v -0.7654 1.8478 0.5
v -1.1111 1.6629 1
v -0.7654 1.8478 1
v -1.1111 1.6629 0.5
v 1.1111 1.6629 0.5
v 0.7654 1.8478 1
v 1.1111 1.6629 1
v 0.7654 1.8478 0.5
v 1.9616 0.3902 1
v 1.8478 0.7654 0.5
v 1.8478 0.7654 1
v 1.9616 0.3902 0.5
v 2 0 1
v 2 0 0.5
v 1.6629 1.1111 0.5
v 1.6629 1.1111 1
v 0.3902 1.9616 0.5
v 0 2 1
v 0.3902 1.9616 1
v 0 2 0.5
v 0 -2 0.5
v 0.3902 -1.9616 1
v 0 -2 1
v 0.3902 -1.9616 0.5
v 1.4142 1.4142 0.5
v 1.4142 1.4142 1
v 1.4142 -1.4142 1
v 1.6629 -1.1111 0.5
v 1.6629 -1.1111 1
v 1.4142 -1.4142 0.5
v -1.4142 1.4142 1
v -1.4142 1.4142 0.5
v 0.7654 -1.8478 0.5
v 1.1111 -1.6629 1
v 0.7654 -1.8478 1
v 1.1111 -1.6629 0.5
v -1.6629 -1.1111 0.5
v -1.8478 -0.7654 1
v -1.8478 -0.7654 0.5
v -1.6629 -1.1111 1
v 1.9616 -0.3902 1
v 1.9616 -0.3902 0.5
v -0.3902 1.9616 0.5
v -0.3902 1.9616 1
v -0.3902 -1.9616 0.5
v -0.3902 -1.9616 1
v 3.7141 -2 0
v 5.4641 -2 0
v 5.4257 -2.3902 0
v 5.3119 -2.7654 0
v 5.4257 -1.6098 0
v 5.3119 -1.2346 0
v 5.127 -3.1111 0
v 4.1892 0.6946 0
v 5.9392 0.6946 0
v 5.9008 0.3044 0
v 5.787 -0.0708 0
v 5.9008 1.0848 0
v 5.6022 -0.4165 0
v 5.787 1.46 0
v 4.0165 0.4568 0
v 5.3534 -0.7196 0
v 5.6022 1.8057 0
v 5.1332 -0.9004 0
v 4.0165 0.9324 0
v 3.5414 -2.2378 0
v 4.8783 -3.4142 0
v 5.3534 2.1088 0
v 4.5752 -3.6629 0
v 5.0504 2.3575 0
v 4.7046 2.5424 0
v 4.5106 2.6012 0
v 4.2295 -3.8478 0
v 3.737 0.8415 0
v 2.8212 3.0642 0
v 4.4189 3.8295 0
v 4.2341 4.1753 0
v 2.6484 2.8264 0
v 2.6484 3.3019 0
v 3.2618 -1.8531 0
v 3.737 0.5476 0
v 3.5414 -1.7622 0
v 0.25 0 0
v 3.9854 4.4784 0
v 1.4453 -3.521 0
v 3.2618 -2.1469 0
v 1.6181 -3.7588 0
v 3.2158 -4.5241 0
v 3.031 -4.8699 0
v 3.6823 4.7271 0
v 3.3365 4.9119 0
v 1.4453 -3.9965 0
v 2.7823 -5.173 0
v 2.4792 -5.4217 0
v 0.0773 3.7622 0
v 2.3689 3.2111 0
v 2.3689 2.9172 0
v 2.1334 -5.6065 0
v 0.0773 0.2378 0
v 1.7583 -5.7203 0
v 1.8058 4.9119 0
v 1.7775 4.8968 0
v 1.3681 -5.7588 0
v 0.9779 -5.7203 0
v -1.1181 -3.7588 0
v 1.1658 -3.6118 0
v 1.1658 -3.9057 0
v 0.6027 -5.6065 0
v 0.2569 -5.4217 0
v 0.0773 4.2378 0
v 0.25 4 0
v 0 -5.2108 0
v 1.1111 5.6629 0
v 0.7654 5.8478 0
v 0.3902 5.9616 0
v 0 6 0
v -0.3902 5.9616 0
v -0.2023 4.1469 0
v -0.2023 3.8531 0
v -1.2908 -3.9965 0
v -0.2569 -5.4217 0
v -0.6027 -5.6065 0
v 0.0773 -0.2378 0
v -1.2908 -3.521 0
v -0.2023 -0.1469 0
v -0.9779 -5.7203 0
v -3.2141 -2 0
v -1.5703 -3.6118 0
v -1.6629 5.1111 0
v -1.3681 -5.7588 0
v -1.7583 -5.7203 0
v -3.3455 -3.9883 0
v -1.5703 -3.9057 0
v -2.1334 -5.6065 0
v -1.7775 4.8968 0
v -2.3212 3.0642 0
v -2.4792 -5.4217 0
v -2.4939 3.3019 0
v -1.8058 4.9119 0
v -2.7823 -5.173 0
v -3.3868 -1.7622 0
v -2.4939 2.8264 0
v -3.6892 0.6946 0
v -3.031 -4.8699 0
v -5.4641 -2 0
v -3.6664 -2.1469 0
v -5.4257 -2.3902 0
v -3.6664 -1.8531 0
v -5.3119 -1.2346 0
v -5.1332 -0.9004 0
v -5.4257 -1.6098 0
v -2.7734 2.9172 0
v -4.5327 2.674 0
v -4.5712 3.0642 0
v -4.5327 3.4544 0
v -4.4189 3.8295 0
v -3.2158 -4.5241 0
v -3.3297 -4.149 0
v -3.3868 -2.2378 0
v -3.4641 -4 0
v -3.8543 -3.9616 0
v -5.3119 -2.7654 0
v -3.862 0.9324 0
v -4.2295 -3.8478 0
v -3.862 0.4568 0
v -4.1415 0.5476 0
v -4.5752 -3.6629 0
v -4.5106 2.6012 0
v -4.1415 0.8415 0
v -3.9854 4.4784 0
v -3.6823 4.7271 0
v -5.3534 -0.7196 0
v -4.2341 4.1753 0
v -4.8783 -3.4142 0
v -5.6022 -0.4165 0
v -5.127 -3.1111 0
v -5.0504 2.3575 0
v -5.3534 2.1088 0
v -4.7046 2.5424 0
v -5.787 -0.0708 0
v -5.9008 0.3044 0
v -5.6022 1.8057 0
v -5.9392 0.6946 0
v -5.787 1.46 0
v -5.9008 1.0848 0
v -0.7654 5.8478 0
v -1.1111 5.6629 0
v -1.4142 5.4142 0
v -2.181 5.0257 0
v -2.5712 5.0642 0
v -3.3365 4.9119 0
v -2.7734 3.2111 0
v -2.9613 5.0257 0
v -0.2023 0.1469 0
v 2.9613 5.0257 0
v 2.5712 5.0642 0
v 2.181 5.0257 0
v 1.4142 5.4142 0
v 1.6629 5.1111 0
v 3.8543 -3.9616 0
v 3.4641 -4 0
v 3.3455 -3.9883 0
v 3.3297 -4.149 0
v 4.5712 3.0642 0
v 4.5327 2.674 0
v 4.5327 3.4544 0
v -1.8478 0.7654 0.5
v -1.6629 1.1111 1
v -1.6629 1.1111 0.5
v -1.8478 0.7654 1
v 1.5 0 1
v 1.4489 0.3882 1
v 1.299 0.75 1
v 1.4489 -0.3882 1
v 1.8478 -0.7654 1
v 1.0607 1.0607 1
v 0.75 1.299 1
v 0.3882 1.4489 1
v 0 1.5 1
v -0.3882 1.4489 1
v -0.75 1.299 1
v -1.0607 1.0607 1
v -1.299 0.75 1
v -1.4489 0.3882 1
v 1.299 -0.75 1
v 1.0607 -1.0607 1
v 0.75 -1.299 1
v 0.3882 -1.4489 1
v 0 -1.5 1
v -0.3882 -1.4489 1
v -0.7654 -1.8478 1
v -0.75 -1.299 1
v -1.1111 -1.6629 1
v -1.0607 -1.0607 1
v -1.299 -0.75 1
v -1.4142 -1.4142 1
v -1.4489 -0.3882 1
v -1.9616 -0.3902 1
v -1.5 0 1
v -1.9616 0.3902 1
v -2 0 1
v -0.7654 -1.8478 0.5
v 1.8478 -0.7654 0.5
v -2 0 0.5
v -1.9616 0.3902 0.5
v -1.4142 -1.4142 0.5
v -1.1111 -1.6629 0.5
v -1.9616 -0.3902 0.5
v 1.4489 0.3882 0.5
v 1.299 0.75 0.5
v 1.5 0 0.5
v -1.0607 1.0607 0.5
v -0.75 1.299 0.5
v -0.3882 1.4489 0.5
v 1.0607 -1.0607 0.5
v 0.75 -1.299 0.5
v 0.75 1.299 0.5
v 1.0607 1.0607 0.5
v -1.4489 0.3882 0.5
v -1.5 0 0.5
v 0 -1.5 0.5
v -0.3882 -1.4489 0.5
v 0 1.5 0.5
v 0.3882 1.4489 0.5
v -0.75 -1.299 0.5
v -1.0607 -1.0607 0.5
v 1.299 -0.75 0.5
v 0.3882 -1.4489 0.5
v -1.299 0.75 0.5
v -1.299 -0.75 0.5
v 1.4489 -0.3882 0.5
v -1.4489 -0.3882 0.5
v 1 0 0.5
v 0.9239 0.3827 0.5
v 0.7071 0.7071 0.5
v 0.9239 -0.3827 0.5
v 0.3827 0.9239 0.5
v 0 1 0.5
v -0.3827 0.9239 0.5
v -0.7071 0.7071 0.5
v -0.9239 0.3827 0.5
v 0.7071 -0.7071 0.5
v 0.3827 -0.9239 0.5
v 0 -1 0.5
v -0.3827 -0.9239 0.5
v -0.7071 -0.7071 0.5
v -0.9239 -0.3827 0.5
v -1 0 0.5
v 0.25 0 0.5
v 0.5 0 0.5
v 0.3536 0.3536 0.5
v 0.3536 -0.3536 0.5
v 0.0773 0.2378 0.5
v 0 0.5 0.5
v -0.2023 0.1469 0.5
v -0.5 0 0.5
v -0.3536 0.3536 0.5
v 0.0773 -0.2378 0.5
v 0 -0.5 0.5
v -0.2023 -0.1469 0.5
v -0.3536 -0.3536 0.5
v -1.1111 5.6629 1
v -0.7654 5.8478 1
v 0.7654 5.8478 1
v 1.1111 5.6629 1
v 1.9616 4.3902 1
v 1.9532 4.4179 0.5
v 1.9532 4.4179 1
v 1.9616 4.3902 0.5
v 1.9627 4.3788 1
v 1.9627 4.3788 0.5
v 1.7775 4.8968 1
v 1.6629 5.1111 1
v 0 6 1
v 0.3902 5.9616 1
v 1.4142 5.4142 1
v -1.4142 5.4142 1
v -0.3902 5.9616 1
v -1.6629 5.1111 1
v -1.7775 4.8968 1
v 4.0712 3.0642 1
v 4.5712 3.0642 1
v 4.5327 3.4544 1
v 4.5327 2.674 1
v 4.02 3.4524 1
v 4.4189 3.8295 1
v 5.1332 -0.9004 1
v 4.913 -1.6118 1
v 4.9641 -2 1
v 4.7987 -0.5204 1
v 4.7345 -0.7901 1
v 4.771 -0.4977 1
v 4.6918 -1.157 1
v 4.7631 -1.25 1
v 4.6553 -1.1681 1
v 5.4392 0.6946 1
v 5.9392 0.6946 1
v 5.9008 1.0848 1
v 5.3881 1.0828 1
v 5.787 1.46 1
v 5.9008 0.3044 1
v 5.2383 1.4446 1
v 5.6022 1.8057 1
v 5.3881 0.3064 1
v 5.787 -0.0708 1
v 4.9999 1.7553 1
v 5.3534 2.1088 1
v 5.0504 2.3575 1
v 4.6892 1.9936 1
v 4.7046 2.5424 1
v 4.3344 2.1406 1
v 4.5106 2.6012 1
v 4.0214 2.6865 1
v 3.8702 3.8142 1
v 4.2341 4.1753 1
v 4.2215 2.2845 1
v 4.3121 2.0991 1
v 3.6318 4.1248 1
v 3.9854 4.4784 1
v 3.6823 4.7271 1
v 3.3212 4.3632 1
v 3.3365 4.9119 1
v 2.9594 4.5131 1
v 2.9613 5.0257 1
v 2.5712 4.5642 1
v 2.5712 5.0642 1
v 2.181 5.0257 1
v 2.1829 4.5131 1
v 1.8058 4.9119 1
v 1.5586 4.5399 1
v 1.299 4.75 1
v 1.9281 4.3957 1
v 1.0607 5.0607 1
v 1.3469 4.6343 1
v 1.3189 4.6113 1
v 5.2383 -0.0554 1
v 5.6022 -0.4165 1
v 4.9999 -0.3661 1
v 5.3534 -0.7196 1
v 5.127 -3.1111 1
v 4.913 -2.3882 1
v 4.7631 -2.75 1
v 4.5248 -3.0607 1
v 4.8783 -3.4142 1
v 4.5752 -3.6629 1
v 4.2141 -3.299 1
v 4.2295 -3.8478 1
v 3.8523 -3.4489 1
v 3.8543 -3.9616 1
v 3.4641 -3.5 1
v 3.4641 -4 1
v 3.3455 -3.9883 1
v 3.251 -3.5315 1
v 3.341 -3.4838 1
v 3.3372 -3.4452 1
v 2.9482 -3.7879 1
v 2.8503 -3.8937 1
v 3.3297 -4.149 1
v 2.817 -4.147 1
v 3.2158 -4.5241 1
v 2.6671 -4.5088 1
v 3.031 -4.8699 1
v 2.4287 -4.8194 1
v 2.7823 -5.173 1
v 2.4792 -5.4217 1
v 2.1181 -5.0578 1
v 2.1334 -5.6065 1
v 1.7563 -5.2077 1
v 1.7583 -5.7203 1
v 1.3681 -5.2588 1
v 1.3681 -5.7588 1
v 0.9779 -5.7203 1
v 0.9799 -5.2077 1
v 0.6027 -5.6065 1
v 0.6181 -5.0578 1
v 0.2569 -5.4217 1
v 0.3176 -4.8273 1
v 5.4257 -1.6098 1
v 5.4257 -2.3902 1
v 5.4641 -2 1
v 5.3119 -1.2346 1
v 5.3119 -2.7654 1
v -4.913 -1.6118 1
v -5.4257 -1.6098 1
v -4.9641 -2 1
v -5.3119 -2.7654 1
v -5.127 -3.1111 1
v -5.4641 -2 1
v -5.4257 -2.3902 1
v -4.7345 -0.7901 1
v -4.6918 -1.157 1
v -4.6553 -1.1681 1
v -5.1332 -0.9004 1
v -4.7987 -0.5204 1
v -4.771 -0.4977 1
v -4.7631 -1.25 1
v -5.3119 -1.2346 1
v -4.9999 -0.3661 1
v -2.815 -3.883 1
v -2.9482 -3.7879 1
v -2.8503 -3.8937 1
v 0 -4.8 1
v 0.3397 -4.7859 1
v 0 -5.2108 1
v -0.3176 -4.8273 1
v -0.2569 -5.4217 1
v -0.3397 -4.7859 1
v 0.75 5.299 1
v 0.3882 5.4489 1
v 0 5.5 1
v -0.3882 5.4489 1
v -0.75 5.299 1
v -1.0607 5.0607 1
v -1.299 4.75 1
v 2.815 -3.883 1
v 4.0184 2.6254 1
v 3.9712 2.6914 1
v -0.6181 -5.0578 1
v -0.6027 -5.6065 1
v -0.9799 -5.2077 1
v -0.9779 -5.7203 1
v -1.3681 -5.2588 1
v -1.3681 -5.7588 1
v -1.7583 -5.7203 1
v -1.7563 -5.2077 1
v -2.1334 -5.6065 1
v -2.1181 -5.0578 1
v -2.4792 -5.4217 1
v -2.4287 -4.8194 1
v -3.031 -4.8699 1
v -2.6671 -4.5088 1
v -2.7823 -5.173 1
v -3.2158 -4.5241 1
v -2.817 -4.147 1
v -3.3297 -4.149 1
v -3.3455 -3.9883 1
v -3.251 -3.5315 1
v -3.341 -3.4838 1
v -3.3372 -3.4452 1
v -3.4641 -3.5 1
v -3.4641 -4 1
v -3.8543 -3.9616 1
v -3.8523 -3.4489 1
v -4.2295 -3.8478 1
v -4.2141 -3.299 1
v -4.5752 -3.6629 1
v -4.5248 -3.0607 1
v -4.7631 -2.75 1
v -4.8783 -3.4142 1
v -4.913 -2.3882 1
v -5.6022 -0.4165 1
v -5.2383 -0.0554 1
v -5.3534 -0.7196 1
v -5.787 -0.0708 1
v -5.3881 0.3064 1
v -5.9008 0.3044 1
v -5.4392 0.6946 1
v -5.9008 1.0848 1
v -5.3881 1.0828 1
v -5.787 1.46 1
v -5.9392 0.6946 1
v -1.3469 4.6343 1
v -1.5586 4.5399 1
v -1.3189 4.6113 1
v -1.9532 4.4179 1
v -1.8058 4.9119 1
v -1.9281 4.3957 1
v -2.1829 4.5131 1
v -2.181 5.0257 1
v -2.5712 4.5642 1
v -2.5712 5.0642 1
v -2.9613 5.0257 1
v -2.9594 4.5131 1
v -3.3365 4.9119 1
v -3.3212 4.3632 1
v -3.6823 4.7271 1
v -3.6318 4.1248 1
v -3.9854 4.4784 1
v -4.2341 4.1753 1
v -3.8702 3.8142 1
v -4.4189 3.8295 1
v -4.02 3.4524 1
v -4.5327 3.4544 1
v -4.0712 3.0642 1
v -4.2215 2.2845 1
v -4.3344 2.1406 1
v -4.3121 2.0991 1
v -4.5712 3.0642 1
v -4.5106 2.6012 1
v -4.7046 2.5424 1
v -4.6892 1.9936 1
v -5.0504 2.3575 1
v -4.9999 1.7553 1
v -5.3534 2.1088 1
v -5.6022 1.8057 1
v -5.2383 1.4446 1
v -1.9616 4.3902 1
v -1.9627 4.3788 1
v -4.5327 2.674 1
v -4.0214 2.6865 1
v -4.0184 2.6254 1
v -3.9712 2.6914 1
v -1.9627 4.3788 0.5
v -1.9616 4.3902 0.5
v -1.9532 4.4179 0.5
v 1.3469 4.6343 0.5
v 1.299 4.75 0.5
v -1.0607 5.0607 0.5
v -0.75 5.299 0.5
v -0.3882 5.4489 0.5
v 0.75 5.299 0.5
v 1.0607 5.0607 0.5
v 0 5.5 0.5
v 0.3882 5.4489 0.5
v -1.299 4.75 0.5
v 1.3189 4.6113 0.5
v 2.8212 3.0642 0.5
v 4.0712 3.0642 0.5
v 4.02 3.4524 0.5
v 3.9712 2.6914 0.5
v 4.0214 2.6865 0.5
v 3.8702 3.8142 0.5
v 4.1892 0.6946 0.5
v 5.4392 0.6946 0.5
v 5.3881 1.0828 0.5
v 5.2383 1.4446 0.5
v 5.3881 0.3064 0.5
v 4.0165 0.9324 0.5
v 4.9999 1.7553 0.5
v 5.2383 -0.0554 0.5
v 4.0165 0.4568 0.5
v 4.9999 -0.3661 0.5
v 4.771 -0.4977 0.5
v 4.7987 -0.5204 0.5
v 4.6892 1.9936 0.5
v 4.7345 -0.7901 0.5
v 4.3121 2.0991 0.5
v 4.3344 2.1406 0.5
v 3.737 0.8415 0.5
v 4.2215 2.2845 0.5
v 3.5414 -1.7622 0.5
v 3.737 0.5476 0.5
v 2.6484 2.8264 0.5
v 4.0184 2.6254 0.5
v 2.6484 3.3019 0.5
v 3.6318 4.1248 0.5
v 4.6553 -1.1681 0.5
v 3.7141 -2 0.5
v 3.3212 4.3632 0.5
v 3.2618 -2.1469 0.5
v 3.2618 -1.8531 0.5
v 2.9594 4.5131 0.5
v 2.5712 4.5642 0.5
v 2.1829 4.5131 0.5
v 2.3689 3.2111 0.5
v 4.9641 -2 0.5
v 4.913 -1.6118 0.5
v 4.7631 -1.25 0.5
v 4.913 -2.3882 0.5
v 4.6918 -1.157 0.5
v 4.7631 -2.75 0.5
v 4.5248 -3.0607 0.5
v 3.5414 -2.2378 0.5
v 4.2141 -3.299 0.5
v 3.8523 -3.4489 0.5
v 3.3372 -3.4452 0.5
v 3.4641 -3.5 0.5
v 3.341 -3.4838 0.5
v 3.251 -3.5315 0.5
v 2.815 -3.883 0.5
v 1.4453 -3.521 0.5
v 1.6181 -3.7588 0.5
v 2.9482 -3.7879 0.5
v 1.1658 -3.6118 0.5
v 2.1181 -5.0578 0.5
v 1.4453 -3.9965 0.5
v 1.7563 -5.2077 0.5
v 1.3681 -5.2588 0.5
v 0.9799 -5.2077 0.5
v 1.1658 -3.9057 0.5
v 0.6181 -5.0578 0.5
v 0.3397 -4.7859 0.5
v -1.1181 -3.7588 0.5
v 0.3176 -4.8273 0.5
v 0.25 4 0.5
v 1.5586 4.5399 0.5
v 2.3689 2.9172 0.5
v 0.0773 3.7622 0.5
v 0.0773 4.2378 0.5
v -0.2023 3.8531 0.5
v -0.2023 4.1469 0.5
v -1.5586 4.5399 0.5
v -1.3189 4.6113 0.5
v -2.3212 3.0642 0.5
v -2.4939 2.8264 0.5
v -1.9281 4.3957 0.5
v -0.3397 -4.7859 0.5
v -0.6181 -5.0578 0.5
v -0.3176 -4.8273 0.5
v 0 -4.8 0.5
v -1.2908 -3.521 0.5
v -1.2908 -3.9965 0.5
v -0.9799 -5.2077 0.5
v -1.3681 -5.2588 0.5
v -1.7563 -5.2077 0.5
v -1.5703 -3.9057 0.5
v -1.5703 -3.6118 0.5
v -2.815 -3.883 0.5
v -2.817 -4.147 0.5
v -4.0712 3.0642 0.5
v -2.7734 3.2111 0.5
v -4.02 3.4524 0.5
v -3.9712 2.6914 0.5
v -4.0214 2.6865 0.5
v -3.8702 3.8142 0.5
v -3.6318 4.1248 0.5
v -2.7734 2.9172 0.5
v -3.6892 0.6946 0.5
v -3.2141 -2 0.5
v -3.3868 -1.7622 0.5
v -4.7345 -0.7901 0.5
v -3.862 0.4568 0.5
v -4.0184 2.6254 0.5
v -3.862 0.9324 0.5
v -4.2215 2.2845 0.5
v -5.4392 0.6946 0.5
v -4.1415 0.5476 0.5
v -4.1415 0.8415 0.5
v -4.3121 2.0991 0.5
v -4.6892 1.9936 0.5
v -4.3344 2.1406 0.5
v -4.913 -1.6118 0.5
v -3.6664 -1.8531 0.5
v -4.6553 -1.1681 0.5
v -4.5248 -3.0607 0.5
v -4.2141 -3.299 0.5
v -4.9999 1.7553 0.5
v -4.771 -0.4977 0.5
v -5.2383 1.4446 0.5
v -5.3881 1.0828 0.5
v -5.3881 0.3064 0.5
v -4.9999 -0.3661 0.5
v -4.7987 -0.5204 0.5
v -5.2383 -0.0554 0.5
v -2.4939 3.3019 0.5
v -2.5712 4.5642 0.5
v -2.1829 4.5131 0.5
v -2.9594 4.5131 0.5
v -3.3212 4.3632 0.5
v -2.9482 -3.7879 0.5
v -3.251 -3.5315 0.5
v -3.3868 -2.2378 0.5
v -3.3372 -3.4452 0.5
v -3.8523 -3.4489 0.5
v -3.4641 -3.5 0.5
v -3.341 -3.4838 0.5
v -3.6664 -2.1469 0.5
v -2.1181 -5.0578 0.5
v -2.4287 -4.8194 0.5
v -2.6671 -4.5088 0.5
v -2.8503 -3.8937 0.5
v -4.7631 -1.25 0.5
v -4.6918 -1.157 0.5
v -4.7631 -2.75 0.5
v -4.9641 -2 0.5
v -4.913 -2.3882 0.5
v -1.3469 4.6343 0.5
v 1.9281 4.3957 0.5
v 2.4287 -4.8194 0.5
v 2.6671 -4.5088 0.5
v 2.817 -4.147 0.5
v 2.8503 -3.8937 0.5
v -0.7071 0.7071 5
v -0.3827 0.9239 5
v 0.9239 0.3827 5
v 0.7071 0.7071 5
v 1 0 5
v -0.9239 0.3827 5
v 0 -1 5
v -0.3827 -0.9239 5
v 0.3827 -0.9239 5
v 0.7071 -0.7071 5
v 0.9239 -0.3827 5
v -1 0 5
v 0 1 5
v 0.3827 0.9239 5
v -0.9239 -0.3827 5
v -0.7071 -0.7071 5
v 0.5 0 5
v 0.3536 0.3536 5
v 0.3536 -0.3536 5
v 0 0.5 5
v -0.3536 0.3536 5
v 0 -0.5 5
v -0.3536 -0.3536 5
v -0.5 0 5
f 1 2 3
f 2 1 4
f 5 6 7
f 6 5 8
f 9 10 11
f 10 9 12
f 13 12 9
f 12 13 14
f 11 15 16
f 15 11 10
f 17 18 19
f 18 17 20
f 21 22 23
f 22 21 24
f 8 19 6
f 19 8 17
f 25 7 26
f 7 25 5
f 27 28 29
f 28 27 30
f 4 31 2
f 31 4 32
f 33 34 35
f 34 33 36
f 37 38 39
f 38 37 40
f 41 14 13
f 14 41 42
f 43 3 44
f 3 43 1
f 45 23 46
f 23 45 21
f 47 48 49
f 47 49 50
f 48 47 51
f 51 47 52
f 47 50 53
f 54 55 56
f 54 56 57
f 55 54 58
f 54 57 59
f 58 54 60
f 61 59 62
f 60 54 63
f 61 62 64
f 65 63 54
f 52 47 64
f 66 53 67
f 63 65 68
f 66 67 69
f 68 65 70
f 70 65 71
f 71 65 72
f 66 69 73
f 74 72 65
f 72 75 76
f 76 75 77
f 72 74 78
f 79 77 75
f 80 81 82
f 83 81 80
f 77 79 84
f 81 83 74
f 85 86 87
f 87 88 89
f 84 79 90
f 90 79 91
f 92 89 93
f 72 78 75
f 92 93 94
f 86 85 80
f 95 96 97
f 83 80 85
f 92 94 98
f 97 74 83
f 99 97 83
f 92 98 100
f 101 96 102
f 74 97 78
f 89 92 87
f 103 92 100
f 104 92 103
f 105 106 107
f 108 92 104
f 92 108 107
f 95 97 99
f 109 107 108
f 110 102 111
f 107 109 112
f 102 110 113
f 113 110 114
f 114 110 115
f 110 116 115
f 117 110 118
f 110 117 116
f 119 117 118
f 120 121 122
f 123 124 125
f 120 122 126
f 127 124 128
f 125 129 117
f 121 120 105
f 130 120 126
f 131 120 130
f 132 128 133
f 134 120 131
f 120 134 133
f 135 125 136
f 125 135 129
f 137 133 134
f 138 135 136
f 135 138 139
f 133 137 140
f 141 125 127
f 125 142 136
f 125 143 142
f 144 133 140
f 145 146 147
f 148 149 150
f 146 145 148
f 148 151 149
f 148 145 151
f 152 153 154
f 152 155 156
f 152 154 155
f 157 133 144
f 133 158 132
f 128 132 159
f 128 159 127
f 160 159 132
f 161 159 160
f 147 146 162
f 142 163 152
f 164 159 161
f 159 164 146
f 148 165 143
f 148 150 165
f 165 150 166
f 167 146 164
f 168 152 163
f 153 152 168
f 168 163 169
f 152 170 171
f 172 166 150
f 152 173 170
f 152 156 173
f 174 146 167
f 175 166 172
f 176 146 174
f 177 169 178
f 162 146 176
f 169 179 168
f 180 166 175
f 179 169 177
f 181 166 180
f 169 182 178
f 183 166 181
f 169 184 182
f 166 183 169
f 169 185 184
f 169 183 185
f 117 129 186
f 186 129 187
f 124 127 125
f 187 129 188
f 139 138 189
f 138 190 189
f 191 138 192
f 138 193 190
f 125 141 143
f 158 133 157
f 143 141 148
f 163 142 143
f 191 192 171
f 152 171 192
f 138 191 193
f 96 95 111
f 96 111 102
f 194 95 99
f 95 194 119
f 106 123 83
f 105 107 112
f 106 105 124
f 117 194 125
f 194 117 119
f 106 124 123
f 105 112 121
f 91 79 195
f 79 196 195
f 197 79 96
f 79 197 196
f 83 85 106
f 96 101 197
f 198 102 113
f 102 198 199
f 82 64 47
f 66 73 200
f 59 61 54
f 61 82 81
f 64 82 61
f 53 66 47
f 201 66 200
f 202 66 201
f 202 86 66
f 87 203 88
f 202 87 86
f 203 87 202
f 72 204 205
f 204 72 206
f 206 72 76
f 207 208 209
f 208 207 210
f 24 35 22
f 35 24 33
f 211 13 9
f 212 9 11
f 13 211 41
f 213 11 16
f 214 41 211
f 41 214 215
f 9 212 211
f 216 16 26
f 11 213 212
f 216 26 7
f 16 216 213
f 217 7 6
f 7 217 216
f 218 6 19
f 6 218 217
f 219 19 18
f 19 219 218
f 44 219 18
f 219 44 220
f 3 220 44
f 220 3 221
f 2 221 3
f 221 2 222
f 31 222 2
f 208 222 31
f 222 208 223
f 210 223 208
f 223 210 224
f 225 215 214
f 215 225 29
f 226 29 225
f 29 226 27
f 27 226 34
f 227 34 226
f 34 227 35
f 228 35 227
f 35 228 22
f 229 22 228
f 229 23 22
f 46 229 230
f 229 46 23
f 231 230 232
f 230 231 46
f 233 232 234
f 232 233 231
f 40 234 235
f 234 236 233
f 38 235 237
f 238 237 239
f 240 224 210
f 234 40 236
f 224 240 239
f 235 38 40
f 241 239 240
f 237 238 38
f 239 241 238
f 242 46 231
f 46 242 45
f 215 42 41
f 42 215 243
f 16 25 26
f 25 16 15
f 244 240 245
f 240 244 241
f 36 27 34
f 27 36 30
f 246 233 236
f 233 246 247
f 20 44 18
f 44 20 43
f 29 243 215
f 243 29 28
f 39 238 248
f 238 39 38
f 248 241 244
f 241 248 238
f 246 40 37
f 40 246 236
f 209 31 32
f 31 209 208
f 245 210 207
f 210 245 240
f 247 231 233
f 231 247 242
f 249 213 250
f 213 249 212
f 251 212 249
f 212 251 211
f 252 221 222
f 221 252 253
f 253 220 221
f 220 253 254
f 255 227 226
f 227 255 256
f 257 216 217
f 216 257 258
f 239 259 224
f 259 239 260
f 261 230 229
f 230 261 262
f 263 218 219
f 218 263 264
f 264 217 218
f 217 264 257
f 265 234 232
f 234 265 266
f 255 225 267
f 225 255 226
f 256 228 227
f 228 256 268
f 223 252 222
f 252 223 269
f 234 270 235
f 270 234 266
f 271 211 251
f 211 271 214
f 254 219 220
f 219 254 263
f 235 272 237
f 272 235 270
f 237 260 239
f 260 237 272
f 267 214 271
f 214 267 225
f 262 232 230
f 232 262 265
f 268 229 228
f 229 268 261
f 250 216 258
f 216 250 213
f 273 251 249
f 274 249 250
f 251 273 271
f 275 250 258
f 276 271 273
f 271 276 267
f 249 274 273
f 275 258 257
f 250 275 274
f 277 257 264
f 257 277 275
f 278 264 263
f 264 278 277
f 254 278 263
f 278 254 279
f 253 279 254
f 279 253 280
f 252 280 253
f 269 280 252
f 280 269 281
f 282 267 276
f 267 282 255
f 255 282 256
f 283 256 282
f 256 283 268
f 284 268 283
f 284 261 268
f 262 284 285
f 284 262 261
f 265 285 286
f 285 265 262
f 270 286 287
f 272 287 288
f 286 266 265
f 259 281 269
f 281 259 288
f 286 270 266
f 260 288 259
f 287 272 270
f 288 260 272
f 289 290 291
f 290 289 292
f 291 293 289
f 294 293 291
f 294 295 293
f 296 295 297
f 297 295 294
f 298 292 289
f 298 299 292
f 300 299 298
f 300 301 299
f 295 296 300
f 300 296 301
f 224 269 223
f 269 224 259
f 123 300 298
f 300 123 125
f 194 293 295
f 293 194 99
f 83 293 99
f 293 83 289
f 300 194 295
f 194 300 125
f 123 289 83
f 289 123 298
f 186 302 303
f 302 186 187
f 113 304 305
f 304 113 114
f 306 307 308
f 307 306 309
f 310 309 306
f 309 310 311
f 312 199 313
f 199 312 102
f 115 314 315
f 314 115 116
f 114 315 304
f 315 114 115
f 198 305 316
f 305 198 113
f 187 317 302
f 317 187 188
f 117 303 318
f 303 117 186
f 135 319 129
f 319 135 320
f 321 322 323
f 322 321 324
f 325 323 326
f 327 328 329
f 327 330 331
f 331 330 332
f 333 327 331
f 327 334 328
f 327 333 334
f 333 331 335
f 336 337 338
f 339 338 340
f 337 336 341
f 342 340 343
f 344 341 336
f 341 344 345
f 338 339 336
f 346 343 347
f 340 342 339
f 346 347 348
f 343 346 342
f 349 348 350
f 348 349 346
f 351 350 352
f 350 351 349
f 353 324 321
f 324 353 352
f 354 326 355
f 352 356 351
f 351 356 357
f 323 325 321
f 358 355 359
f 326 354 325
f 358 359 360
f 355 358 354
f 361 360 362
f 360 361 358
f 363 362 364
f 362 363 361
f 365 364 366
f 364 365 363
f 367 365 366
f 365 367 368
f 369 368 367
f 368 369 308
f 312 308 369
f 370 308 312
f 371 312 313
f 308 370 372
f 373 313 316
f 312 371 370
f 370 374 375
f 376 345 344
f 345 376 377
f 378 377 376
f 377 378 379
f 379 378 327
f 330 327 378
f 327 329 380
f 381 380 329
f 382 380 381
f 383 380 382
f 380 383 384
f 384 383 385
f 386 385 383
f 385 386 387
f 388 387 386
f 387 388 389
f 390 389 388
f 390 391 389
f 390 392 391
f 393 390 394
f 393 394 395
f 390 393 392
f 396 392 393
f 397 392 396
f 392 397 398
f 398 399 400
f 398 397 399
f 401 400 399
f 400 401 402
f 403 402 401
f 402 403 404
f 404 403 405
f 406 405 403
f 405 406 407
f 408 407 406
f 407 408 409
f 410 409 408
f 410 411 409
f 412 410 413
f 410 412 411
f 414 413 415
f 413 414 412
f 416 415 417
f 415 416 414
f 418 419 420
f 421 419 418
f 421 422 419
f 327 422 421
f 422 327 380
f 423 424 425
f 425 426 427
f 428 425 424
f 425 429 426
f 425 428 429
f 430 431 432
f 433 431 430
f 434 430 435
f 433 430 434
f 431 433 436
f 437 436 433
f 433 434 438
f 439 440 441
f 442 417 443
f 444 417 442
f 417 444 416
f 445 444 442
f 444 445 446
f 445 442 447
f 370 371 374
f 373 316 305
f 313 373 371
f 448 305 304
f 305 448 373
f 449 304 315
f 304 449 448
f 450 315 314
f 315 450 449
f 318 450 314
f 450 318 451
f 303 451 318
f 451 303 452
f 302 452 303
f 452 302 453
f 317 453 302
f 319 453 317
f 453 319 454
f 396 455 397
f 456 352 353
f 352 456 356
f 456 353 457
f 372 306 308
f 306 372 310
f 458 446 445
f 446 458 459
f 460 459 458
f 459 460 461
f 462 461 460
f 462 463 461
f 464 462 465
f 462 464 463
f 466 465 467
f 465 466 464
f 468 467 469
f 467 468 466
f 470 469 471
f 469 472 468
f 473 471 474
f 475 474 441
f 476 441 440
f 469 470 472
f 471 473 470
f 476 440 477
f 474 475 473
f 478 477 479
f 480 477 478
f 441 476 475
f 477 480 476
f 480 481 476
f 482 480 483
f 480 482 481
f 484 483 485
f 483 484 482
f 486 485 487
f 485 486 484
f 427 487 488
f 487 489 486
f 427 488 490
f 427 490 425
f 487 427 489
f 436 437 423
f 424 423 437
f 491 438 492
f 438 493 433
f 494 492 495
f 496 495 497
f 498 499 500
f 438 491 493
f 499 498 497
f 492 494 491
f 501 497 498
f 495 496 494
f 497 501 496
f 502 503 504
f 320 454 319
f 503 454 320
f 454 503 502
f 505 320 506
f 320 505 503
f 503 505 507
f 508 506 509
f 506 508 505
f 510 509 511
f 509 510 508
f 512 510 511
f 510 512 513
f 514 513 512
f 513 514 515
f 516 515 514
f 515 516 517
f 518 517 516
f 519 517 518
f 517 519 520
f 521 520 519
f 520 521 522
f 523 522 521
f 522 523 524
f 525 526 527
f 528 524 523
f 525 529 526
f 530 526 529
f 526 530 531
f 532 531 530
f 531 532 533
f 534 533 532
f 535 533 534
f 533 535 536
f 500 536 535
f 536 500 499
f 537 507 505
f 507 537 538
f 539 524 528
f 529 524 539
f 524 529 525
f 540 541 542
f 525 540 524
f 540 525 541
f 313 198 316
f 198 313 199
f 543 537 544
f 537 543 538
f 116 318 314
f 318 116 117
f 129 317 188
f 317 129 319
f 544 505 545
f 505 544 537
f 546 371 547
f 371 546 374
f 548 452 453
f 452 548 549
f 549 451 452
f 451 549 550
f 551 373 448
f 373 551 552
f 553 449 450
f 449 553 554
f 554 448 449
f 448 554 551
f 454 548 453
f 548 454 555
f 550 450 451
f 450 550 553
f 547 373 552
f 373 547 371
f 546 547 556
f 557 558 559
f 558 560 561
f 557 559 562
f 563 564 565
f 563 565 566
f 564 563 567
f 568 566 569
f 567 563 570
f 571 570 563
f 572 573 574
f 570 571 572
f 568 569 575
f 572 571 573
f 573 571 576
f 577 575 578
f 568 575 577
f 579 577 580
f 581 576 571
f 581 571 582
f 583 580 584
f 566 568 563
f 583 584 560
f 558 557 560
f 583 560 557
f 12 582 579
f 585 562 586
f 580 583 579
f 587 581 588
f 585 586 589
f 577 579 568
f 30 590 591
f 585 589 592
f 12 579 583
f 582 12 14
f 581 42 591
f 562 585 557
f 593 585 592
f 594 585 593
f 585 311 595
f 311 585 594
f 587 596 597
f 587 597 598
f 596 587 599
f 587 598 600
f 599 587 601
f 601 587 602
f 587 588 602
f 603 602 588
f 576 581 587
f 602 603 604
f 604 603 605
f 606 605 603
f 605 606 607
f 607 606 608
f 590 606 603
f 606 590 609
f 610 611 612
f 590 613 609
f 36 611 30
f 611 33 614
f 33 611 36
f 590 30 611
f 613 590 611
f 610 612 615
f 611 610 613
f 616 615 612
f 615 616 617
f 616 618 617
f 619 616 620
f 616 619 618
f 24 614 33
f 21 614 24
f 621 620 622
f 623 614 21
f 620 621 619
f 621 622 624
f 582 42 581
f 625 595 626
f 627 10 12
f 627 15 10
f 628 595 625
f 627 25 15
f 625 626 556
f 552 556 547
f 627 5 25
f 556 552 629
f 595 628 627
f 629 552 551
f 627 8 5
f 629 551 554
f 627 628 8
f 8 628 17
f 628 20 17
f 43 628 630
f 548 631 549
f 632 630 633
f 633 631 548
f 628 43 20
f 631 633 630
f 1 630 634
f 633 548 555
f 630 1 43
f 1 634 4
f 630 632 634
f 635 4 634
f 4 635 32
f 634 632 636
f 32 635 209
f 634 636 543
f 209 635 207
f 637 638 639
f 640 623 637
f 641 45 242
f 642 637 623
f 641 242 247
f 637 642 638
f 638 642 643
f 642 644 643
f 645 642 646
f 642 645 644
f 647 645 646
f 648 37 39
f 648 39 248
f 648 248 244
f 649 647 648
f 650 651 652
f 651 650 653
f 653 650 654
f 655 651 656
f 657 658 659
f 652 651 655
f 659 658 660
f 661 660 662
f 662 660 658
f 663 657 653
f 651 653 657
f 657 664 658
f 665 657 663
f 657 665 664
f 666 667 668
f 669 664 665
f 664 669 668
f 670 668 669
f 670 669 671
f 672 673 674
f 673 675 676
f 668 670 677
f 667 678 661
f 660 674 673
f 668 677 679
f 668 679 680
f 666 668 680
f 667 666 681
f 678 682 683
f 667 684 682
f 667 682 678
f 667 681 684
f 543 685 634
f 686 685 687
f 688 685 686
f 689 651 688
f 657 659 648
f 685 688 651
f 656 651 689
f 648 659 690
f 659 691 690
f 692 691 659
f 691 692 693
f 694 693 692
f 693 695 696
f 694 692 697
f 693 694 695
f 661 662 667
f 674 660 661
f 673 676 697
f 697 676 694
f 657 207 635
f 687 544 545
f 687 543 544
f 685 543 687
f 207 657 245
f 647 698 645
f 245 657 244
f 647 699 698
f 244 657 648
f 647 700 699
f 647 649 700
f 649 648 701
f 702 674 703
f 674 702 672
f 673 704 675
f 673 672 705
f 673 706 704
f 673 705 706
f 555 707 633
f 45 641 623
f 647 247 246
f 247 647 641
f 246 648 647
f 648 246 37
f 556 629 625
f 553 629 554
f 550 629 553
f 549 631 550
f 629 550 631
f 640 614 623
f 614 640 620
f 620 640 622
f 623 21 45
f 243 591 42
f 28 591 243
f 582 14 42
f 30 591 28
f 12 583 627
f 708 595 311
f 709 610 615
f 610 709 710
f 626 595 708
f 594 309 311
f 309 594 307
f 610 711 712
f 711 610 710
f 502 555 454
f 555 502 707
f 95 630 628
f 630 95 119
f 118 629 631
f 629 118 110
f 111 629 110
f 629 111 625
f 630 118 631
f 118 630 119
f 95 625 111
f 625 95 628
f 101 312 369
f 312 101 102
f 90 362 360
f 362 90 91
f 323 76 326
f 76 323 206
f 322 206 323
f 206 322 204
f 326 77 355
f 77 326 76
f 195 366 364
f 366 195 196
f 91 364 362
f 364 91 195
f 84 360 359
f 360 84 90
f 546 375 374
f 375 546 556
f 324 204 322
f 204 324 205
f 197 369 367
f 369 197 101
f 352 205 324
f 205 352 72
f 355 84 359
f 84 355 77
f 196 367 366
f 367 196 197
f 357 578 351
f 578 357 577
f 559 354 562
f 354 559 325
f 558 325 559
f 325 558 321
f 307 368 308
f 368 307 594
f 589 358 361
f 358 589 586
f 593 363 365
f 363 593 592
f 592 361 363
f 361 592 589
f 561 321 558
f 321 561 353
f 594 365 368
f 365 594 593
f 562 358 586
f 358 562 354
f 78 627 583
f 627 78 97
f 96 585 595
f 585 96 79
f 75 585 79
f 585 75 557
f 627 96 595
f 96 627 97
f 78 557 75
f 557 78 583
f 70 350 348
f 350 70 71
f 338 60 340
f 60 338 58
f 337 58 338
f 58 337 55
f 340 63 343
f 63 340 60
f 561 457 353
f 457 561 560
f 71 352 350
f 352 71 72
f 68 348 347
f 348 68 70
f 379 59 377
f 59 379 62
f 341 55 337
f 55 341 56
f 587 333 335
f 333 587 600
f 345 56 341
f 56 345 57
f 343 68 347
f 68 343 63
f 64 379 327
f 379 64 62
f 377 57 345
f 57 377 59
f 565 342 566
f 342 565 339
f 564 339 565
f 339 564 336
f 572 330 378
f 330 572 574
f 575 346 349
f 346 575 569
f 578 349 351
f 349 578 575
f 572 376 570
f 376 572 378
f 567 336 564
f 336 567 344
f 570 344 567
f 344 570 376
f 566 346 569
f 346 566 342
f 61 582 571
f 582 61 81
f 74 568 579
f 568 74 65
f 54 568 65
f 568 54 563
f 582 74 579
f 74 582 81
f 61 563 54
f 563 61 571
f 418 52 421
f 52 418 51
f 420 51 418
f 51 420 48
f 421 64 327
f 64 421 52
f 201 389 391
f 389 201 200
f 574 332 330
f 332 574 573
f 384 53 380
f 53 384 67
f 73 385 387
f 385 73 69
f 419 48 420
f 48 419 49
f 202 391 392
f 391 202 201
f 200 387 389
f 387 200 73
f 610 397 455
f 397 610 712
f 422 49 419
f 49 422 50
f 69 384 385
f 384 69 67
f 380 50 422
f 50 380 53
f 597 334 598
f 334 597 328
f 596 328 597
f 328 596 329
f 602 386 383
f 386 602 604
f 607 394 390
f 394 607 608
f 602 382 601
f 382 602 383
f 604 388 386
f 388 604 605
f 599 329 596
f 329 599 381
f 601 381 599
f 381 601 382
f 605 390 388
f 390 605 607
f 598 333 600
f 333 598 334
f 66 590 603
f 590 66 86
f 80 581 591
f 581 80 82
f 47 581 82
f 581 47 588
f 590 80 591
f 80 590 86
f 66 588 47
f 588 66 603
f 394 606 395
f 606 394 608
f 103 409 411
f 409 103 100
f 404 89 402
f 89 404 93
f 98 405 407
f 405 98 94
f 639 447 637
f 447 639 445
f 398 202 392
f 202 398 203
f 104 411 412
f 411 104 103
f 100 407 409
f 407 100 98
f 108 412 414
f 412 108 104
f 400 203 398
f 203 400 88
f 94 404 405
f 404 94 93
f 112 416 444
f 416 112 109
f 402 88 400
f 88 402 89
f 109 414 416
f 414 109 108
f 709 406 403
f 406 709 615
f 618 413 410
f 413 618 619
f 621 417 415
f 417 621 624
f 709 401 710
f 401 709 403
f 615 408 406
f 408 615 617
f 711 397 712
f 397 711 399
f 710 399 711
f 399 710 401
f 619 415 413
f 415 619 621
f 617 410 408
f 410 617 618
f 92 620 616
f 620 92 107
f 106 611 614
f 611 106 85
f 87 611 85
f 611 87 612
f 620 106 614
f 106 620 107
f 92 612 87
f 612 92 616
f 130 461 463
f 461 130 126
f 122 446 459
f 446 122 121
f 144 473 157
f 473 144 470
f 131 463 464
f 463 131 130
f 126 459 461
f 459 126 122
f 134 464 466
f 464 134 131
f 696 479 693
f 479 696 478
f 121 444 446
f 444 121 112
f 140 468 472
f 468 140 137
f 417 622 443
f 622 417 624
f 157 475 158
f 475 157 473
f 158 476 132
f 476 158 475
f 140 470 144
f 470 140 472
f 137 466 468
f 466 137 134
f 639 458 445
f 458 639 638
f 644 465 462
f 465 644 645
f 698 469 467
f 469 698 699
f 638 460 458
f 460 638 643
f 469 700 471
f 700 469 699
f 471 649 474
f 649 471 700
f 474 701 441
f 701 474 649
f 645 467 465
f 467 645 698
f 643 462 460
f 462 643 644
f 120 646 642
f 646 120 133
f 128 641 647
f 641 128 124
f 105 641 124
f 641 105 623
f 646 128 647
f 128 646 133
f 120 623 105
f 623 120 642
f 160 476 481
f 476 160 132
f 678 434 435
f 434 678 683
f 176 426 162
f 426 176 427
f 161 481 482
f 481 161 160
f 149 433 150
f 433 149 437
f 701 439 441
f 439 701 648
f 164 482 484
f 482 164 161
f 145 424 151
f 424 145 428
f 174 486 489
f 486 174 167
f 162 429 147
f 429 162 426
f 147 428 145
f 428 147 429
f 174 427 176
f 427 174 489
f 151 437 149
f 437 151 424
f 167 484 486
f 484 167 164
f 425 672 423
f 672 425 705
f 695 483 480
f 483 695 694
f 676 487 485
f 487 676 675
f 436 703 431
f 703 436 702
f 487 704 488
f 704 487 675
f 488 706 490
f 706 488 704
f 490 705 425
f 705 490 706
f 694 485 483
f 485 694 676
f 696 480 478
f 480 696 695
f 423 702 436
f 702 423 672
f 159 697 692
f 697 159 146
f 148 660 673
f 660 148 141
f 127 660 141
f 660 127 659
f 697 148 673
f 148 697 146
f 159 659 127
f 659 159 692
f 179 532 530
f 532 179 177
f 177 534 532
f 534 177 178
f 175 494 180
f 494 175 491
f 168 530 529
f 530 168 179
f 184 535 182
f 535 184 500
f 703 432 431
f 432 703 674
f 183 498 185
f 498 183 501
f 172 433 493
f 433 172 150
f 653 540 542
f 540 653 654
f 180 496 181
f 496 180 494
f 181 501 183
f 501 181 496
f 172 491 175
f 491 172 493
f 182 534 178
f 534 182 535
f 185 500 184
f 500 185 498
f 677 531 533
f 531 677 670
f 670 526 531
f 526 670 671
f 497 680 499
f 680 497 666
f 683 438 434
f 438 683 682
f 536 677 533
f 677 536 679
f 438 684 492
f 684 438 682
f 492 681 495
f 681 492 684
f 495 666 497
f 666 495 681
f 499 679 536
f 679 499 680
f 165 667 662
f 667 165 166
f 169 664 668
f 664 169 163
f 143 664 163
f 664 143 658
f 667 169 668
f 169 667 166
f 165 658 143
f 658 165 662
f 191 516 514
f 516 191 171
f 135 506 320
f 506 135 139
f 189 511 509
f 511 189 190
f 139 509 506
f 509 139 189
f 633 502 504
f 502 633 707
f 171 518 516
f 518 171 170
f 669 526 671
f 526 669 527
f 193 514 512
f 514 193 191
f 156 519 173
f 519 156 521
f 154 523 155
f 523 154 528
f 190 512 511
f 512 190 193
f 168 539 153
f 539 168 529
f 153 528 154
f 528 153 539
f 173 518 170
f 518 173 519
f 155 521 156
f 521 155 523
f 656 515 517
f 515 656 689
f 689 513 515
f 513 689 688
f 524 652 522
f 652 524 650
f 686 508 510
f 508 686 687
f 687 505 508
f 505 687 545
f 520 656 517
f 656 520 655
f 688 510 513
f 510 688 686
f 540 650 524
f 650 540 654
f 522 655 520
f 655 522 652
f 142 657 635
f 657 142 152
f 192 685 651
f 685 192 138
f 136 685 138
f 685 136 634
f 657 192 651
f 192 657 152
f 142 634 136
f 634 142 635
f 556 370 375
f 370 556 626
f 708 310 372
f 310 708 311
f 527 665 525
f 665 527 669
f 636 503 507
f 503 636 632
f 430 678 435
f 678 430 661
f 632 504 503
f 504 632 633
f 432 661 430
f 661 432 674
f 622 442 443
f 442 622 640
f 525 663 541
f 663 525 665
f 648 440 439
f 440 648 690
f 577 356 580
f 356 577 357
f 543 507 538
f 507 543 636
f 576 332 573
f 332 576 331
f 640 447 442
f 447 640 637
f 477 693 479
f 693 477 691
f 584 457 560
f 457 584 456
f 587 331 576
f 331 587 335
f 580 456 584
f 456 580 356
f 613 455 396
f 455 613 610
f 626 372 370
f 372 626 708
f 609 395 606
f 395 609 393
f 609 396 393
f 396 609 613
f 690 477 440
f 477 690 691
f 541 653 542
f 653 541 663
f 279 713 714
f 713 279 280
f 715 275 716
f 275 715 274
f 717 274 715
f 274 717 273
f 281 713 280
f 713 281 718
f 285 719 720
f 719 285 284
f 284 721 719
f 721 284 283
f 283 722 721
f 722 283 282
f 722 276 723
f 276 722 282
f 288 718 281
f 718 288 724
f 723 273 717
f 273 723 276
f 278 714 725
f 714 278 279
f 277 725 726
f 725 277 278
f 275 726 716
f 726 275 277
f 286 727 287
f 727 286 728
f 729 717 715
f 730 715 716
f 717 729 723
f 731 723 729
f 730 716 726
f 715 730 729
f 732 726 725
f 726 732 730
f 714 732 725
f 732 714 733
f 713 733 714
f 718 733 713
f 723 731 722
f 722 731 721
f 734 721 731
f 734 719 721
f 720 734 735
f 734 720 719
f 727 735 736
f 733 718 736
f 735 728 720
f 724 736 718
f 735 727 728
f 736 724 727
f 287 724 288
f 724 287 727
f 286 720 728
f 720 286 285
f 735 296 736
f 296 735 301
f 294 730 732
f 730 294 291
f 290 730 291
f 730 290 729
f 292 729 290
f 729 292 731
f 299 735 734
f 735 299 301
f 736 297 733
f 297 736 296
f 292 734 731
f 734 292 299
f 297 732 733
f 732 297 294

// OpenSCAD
// Resolution for 3D printing:
$fa = 1;
$fs = 0.4;

// Allgemeines:
delta    = 0.1;  // Standard Durchdringung

l        = 4.0;  // Abstand zwischen den Widerständen
z        = 1.0;  // Dicke der Abstandshalter
d        = 0.5;  // Wanddicke
ld       = 0.5;  // Lochdurchmesser
rohr_l   = 5.0;  // Rohrlänge
rohr_d   = 2.0;  // Rohrdicke

module scheibe() {
    difference() {
        difference() {
            cylinder(d = l, h = z);
            translate([0, 0, d])
                cylinder(d = l - 2*d, h = d + delta);
        };
        translate([0, 0, -delta])
            cylinder(d = ld, h = z + 2 * delta);
    }
}

module fill() {
    difference() {
        cylinder(d = l + 2 * d, h = d);
        translate([0, 0, -delta])
            cylinder(d = l - 2 * d, h = d + 2 * delta);
    }
}

module full() {
    for (n = [0 : 40 : 320]) {
        translate([ l * sin(n), l * cos(n), 0 ])
            scheibe();
    }; // end for //

    fill();
    scheibe();
}

module cut() {
    difference() {
        translate([0, 0, d])
            cylinder(d = 9.6, h = z);
        translate([0, 0, -delta])
            cylinder(d = l, h = z + 2 * delta);
    }
}

module rohr() {
    difference() {
        cylinder(d = rohr_d, h = rohr_l);
        translate([0, 0, -delta])
            cylinder(d = 2*ld, h = rohr_l + 2 * delta);
    }
}

module print() {
    difference() {
        full();
        cut();
    }
    rohr();
}

print();
